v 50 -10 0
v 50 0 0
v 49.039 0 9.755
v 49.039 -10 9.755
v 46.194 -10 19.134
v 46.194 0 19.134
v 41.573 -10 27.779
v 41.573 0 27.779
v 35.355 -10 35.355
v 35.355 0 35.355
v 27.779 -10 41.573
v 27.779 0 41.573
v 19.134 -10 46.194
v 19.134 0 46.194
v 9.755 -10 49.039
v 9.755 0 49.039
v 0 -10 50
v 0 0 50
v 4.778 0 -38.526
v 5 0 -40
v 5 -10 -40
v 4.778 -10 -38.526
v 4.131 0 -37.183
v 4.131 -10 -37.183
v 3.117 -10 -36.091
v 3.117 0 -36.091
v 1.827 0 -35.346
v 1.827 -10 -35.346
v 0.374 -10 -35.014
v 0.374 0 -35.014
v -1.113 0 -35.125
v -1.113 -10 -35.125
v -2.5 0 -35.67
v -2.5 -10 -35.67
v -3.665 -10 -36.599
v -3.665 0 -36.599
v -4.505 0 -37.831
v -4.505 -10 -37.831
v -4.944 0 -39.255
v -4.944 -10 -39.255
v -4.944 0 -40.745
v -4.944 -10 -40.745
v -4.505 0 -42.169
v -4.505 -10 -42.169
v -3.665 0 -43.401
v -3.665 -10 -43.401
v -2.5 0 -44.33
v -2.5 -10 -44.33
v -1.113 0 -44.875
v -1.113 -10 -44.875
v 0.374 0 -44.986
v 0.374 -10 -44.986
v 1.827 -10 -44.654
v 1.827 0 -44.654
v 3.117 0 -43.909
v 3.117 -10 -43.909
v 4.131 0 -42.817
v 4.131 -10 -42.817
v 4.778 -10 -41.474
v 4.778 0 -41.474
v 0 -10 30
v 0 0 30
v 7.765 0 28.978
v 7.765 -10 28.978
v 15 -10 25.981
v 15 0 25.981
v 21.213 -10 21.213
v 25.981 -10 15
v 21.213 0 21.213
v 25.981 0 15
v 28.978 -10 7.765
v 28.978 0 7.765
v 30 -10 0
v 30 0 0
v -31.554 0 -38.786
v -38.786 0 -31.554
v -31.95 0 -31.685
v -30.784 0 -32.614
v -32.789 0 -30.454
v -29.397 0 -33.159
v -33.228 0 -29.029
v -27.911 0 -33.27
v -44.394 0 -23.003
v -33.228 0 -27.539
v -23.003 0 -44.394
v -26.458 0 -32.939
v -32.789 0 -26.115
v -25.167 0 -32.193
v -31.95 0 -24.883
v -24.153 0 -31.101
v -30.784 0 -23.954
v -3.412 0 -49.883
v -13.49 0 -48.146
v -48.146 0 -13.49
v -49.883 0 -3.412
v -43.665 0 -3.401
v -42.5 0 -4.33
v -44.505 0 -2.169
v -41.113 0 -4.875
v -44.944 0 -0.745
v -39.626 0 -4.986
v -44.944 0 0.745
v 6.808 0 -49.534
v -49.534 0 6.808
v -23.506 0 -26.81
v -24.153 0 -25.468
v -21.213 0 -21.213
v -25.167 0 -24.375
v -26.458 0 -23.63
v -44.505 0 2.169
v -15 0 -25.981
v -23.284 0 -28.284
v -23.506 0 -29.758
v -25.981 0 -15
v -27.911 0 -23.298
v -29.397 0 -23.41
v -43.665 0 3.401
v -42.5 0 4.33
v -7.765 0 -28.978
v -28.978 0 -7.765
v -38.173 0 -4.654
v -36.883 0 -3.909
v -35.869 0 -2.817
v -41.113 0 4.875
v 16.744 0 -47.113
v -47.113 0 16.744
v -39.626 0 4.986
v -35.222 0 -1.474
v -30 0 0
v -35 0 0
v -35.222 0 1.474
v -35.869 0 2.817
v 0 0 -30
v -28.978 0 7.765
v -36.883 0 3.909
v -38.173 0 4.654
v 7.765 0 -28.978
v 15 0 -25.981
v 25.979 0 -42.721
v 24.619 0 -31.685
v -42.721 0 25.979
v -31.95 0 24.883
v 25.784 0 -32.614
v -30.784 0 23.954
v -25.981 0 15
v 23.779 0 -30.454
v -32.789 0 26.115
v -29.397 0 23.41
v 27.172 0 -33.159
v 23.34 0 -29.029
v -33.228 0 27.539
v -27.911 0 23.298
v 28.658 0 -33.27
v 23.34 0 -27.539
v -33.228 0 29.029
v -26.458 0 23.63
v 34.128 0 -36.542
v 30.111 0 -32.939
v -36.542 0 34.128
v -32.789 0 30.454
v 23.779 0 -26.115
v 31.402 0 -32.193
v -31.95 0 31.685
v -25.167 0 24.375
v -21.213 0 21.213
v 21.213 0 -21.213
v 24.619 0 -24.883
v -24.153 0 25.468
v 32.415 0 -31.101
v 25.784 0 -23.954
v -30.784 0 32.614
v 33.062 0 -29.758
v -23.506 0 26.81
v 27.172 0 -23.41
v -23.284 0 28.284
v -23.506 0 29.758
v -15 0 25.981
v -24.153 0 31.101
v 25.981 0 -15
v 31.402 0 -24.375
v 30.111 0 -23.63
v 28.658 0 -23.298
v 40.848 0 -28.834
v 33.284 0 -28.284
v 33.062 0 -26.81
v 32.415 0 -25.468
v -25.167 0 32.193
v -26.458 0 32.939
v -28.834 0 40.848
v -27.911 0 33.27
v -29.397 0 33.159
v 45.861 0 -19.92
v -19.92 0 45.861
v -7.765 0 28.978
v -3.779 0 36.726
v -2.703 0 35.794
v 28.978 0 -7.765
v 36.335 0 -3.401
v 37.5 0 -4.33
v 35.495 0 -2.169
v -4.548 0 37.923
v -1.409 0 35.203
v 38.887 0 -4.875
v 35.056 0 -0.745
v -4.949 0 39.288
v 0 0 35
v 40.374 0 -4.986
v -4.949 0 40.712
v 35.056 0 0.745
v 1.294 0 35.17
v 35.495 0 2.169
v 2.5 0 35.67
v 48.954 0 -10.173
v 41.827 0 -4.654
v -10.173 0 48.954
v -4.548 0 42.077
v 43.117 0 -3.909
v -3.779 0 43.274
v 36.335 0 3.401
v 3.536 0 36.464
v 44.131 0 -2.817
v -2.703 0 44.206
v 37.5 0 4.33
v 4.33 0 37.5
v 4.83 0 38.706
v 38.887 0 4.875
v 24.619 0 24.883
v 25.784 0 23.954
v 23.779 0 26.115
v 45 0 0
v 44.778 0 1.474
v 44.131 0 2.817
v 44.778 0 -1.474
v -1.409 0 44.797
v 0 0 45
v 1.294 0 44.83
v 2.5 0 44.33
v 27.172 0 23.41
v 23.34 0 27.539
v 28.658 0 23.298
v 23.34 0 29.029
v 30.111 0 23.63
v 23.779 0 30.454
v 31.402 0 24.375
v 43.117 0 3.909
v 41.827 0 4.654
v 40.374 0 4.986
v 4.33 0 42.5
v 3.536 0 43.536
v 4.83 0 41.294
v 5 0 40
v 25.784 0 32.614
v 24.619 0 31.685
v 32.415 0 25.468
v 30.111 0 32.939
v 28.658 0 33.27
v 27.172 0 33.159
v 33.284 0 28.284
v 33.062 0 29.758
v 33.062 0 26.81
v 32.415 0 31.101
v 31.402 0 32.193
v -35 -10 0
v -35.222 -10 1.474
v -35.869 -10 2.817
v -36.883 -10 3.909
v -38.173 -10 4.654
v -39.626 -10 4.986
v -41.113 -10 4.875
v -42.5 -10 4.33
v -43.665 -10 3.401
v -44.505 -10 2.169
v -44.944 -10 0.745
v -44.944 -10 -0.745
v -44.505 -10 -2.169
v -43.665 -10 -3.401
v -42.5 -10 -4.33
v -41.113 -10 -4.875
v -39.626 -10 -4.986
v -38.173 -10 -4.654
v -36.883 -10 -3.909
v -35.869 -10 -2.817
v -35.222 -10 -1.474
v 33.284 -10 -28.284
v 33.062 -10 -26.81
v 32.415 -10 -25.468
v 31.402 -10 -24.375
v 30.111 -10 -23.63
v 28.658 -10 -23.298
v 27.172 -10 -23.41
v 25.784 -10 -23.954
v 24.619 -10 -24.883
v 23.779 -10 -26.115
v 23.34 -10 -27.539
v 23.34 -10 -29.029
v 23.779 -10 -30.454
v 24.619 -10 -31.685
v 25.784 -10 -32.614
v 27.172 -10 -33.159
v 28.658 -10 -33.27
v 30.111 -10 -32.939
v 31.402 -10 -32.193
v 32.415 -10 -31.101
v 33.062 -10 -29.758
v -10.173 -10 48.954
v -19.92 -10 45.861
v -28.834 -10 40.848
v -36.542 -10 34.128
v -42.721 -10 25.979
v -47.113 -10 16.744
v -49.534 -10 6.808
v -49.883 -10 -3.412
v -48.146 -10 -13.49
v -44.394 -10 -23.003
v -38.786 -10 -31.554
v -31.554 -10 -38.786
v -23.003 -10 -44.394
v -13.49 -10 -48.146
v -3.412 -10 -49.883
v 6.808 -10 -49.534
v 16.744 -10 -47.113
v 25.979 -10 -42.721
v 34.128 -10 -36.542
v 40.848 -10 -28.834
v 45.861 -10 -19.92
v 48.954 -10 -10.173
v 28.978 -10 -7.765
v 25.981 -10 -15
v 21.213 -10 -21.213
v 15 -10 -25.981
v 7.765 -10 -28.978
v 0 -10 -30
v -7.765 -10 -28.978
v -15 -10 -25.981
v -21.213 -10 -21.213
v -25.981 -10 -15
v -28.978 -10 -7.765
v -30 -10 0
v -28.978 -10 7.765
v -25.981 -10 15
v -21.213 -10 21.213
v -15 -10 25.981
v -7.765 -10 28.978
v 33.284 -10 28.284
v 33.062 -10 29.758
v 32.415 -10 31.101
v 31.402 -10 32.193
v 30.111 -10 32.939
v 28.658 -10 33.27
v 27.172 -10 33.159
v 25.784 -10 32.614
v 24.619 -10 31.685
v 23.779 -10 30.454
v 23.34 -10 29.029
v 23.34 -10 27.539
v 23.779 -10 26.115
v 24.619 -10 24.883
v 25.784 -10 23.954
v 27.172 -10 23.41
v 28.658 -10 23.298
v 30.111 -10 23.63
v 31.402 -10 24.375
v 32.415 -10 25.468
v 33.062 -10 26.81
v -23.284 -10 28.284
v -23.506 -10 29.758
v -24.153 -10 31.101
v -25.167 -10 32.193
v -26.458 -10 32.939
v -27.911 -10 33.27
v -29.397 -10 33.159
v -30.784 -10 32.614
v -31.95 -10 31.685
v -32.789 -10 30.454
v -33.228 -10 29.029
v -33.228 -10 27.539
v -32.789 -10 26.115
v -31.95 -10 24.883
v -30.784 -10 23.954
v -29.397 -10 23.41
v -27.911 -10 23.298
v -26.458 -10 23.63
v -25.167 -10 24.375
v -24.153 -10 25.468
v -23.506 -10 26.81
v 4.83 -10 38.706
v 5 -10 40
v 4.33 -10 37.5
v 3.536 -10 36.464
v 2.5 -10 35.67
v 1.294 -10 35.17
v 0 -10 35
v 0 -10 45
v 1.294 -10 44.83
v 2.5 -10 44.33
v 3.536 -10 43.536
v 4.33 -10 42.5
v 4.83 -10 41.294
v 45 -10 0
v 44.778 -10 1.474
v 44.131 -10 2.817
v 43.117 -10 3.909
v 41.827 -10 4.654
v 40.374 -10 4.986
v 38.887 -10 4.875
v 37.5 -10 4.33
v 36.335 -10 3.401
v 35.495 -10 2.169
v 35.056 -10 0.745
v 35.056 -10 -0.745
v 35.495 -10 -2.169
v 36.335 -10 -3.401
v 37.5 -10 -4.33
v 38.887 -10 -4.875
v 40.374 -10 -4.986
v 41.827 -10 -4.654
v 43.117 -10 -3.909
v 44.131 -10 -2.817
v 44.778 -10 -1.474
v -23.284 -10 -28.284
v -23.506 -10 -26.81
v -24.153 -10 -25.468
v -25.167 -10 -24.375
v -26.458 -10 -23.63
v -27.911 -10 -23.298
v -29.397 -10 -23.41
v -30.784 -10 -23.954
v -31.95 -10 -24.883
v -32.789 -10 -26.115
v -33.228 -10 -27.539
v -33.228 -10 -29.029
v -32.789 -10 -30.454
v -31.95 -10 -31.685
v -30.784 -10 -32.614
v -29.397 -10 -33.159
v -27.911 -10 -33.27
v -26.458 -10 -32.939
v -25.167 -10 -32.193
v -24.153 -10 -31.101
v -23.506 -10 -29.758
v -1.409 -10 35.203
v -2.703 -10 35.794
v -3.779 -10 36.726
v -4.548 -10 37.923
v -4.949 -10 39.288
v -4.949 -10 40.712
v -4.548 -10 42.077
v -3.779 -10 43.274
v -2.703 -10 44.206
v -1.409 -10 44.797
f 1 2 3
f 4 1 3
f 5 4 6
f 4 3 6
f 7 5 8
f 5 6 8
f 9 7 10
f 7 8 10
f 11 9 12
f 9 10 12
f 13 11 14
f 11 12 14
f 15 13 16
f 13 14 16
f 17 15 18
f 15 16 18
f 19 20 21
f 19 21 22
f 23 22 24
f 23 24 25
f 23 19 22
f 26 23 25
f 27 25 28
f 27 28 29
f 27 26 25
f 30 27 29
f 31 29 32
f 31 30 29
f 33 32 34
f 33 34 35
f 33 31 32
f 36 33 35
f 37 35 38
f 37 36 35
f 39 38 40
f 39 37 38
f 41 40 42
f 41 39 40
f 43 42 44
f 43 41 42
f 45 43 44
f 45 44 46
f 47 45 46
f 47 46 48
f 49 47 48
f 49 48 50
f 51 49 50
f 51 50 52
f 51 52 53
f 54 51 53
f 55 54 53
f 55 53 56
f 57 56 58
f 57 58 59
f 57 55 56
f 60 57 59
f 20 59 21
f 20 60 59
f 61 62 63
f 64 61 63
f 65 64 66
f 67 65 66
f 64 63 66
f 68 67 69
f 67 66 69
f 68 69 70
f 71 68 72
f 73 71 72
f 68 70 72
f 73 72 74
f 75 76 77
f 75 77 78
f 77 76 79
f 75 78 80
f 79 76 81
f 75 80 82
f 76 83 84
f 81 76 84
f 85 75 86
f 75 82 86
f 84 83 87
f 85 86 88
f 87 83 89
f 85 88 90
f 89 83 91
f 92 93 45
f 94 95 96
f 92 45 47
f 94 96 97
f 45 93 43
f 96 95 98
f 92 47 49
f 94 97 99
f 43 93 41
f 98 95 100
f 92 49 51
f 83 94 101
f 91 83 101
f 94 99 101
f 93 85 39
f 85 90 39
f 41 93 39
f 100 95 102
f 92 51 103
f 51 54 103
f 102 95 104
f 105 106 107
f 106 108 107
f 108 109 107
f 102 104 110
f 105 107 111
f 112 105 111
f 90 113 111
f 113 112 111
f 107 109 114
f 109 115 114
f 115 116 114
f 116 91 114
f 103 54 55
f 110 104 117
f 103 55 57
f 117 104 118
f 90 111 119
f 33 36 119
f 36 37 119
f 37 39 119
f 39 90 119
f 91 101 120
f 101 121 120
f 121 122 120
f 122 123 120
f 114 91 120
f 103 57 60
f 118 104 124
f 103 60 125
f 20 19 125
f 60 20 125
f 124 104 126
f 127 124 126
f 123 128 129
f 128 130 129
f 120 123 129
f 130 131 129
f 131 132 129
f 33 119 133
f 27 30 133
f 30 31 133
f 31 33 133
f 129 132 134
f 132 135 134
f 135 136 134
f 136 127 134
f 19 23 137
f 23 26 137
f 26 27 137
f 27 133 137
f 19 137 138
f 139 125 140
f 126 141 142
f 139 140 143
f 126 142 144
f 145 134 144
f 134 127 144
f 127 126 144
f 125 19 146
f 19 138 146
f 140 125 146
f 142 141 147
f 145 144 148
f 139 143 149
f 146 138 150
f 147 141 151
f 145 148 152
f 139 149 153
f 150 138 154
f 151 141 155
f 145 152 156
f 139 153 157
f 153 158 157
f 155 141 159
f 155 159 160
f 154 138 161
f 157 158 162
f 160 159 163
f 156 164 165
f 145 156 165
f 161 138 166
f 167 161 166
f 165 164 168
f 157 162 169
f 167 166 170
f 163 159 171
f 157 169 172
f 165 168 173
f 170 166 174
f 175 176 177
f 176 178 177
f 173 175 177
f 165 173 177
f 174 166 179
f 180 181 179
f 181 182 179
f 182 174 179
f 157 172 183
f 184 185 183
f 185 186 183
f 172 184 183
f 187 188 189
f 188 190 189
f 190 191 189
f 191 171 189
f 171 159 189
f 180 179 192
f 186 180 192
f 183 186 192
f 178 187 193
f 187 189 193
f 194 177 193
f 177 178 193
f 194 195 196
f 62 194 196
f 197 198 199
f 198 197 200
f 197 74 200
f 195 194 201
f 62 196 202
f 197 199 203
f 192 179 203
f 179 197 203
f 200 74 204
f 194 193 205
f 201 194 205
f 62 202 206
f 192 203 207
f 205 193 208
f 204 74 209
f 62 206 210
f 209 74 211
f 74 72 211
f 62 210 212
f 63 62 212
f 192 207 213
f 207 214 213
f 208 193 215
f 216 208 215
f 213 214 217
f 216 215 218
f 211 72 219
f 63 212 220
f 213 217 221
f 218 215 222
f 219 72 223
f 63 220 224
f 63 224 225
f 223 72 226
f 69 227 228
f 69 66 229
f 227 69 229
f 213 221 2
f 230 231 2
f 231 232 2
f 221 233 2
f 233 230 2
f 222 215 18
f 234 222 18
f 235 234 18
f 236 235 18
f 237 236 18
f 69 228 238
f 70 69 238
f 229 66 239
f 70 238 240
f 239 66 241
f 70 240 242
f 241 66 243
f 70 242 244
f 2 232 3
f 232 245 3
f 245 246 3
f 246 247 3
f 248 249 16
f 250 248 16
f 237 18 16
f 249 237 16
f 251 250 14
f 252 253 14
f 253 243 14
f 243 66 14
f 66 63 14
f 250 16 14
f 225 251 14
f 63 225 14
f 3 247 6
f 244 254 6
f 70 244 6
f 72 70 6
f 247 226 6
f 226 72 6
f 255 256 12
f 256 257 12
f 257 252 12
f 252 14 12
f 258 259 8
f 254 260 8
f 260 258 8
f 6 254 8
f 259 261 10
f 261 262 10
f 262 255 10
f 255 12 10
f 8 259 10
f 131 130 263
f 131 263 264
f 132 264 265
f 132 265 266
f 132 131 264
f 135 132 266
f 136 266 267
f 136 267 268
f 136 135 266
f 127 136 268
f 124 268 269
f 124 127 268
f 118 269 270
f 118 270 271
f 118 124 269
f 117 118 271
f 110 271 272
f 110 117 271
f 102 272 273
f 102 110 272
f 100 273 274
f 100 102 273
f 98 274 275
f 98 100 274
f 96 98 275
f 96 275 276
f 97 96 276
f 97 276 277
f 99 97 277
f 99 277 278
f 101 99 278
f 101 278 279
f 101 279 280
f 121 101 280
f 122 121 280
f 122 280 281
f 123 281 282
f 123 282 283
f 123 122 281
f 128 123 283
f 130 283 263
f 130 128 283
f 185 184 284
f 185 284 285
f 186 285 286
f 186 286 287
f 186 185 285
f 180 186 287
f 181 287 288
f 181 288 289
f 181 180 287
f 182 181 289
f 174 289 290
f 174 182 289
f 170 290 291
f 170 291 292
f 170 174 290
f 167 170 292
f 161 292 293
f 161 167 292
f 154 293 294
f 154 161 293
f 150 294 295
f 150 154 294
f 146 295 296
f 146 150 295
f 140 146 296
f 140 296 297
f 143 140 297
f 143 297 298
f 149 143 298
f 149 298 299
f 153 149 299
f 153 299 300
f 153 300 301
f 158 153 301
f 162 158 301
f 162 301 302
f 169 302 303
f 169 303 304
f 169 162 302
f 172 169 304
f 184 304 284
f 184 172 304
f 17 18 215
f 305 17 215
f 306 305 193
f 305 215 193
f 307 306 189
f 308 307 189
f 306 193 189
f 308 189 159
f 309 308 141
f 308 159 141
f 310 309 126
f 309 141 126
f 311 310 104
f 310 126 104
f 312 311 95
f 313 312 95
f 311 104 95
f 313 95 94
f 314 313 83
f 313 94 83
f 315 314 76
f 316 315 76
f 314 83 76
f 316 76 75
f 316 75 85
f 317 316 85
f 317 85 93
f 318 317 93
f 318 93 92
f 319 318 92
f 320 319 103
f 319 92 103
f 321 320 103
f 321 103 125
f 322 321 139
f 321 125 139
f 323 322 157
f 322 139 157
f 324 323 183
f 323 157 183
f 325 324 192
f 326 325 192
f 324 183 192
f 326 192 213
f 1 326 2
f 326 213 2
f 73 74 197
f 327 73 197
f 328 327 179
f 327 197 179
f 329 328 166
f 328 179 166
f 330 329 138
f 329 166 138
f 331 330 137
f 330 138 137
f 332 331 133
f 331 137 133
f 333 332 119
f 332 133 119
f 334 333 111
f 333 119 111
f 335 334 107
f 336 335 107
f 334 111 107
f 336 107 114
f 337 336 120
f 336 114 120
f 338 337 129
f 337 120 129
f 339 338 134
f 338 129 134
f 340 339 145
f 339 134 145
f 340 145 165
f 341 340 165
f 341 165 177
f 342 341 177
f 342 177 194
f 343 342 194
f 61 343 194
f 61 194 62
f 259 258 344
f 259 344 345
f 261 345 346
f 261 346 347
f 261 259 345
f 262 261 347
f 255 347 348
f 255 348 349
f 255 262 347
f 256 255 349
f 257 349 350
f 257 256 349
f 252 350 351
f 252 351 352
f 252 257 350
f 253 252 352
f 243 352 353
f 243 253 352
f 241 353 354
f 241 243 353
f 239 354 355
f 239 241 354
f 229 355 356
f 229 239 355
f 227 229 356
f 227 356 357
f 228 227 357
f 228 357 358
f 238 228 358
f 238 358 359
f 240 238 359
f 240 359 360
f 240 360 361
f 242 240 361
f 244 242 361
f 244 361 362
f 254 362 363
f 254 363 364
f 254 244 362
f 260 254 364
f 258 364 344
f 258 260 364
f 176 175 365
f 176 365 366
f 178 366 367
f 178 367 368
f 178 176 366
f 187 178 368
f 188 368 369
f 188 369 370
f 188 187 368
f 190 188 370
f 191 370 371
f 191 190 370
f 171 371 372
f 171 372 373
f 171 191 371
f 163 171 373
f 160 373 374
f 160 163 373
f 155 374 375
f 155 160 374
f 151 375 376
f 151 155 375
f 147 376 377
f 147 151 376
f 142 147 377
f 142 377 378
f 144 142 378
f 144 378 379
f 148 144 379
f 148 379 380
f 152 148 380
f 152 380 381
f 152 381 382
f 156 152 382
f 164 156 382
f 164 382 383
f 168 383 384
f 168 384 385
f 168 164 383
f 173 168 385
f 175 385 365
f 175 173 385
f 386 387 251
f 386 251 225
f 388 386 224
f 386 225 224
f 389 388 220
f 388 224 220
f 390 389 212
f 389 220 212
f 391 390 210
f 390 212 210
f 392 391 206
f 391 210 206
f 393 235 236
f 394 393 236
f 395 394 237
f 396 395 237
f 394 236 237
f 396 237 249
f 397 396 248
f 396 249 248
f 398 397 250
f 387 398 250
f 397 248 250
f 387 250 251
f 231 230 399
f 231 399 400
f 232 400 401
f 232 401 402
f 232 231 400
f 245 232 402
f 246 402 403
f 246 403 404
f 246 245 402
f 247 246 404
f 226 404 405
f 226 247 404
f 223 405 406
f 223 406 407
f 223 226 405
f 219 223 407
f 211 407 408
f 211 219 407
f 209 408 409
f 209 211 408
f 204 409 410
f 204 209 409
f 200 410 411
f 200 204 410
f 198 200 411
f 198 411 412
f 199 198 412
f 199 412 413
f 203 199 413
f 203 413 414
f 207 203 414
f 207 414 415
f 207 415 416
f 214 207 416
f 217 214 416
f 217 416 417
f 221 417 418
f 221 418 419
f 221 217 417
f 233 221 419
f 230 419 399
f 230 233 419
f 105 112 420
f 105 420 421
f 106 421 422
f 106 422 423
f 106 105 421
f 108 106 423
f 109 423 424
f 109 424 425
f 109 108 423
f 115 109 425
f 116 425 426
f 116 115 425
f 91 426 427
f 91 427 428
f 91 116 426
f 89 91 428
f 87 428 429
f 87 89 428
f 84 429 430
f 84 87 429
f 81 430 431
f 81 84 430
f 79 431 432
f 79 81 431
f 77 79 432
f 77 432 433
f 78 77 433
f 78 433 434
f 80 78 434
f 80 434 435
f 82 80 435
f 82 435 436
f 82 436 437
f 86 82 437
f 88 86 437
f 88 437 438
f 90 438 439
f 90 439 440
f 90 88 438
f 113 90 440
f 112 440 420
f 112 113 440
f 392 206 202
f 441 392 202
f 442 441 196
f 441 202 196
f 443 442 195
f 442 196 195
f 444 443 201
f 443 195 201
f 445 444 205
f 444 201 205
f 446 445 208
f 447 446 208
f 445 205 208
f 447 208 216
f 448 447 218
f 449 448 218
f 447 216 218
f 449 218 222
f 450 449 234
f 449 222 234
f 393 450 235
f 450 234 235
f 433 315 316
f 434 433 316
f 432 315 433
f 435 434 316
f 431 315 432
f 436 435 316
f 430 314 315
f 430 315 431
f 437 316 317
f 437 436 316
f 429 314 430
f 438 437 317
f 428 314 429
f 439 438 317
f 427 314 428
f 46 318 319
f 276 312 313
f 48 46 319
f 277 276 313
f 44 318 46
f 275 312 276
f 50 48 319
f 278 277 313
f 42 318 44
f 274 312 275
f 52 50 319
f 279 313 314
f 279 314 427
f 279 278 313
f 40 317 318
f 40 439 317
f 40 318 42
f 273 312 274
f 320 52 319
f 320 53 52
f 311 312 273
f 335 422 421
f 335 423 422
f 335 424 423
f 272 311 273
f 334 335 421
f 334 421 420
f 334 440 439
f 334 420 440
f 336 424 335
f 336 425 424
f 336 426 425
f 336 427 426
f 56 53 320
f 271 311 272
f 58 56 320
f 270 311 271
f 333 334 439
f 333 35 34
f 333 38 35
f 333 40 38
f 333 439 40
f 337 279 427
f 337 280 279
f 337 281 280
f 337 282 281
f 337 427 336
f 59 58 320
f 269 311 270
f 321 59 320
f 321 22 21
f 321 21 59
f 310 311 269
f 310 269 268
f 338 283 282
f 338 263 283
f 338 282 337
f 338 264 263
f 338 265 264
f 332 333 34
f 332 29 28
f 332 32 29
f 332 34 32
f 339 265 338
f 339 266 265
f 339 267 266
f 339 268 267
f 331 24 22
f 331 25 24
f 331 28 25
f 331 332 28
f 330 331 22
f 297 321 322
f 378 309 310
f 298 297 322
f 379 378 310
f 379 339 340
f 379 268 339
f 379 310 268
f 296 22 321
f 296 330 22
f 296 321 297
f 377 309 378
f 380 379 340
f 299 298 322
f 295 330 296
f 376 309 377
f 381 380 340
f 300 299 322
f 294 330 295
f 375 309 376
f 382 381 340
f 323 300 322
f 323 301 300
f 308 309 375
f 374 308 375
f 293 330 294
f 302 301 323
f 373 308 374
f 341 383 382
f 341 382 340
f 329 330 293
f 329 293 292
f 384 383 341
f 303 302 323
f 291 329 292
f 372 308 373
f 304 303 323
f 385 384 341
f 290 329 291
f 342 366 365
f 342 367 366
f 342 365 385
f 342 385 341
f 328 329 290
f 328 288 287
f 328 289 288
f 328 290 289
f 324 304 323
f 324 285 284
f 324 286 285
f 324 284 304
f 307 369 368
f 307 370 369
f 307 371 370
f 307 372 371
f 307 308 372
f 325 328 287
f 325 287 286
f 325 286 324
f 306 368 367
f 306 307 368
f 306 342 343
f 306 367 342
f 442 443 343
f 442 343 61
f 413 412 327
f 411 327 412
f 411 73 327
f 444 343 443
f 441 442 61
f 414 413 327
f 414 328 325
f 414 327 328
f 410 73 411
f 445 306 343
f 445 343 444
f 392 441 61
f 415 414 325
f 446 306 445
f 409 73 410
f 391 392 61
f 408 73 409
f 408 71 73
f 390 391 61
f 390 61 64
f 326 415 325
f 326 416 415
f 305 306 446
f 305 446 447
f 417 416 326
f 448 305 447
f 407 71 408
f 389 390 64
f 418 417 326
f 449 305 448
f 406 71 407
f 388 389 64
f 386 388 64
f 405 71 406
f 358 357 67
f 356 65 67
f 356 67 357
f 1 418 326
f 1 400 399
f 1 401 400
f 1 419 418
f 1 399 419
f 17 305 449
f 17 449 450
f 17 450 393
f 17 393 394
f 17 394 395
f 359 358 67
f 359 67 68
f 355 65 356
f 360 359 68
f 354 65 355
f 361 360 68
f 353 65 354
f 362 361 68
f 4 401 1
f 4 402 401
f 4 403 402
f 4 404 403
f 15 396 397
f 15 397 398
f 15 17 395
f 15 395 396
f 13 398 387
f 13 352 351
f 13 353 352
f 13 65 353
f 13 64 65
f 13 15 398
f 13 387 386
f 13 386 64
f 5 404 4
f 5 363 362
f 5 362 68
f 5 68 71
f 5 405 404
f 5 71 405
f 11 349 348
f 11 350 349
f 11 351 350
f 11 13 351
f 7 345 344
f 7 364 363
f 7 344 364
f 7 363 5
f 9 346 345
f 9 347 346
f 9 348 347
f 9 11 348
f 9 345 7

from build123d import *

# Parameters (mm, degrees)
F0_R     = 5
F1_DEPTH = 10


with BuildPart() as f1:
    # F0 (on Front) → F1 (new body)
    with BuildSketch(Plane.XZ):
        with BuildLine():
            ThreePointArc((0, 50), (-35.355339, -35.355339), (50, 0))
            ThreePointArc((50, 0), (35.355339, 35.355339), (0, 50))
        make_face()
        with Locations((-28.284271, -28.284271)):
            Circle(F0_R, mode=Mode.SUBTRACT)
        with Locations((0, -40)):
            Circle(F0_R, mode=Mode.SUBTRACT)
        with Locations((28.284271, -28.284271)):
            Circle(F0_R, mode=Mode.SUBTRACT)
        with Locations((-40, 0)):
            Circle(F0_R, mode=Mode.SUBTRACT)
        with Locations((-28.284271, 28.284271)):
            Circle(F0_R, mode=Mode.SUBTRACT)
        with BuildLine():
            ThreePointArc((30, 0), (-21.213203, -21.213203), (0, 30))
            ThreePointArc((0, 30), (21.213203, 21.213203), (30, 0))
        make_face(mode=Mode.SUBTRACT)
        with Locations((40, 0)):
            Circle(F0_R, mode=Mode.SUBTRACT)
        with BuildLine():
            ThreePointArc((0, 35), (-5, 40), (0, 45))
            ThreePointArc((0, 45), (3.535534, 43.535534), (5, 40))
            ThreePointArc((5, 40), (3.535534, 36.464466), (0, 35))
        make_face(mode=Mode.SUBTRACT)
        with Locations((28.284271, 28.284271)):
            Circle(F0_R, mode=Mode.SUBTRACT)
    extrude(amount=F1_DEPTH)


solid = f1.part
